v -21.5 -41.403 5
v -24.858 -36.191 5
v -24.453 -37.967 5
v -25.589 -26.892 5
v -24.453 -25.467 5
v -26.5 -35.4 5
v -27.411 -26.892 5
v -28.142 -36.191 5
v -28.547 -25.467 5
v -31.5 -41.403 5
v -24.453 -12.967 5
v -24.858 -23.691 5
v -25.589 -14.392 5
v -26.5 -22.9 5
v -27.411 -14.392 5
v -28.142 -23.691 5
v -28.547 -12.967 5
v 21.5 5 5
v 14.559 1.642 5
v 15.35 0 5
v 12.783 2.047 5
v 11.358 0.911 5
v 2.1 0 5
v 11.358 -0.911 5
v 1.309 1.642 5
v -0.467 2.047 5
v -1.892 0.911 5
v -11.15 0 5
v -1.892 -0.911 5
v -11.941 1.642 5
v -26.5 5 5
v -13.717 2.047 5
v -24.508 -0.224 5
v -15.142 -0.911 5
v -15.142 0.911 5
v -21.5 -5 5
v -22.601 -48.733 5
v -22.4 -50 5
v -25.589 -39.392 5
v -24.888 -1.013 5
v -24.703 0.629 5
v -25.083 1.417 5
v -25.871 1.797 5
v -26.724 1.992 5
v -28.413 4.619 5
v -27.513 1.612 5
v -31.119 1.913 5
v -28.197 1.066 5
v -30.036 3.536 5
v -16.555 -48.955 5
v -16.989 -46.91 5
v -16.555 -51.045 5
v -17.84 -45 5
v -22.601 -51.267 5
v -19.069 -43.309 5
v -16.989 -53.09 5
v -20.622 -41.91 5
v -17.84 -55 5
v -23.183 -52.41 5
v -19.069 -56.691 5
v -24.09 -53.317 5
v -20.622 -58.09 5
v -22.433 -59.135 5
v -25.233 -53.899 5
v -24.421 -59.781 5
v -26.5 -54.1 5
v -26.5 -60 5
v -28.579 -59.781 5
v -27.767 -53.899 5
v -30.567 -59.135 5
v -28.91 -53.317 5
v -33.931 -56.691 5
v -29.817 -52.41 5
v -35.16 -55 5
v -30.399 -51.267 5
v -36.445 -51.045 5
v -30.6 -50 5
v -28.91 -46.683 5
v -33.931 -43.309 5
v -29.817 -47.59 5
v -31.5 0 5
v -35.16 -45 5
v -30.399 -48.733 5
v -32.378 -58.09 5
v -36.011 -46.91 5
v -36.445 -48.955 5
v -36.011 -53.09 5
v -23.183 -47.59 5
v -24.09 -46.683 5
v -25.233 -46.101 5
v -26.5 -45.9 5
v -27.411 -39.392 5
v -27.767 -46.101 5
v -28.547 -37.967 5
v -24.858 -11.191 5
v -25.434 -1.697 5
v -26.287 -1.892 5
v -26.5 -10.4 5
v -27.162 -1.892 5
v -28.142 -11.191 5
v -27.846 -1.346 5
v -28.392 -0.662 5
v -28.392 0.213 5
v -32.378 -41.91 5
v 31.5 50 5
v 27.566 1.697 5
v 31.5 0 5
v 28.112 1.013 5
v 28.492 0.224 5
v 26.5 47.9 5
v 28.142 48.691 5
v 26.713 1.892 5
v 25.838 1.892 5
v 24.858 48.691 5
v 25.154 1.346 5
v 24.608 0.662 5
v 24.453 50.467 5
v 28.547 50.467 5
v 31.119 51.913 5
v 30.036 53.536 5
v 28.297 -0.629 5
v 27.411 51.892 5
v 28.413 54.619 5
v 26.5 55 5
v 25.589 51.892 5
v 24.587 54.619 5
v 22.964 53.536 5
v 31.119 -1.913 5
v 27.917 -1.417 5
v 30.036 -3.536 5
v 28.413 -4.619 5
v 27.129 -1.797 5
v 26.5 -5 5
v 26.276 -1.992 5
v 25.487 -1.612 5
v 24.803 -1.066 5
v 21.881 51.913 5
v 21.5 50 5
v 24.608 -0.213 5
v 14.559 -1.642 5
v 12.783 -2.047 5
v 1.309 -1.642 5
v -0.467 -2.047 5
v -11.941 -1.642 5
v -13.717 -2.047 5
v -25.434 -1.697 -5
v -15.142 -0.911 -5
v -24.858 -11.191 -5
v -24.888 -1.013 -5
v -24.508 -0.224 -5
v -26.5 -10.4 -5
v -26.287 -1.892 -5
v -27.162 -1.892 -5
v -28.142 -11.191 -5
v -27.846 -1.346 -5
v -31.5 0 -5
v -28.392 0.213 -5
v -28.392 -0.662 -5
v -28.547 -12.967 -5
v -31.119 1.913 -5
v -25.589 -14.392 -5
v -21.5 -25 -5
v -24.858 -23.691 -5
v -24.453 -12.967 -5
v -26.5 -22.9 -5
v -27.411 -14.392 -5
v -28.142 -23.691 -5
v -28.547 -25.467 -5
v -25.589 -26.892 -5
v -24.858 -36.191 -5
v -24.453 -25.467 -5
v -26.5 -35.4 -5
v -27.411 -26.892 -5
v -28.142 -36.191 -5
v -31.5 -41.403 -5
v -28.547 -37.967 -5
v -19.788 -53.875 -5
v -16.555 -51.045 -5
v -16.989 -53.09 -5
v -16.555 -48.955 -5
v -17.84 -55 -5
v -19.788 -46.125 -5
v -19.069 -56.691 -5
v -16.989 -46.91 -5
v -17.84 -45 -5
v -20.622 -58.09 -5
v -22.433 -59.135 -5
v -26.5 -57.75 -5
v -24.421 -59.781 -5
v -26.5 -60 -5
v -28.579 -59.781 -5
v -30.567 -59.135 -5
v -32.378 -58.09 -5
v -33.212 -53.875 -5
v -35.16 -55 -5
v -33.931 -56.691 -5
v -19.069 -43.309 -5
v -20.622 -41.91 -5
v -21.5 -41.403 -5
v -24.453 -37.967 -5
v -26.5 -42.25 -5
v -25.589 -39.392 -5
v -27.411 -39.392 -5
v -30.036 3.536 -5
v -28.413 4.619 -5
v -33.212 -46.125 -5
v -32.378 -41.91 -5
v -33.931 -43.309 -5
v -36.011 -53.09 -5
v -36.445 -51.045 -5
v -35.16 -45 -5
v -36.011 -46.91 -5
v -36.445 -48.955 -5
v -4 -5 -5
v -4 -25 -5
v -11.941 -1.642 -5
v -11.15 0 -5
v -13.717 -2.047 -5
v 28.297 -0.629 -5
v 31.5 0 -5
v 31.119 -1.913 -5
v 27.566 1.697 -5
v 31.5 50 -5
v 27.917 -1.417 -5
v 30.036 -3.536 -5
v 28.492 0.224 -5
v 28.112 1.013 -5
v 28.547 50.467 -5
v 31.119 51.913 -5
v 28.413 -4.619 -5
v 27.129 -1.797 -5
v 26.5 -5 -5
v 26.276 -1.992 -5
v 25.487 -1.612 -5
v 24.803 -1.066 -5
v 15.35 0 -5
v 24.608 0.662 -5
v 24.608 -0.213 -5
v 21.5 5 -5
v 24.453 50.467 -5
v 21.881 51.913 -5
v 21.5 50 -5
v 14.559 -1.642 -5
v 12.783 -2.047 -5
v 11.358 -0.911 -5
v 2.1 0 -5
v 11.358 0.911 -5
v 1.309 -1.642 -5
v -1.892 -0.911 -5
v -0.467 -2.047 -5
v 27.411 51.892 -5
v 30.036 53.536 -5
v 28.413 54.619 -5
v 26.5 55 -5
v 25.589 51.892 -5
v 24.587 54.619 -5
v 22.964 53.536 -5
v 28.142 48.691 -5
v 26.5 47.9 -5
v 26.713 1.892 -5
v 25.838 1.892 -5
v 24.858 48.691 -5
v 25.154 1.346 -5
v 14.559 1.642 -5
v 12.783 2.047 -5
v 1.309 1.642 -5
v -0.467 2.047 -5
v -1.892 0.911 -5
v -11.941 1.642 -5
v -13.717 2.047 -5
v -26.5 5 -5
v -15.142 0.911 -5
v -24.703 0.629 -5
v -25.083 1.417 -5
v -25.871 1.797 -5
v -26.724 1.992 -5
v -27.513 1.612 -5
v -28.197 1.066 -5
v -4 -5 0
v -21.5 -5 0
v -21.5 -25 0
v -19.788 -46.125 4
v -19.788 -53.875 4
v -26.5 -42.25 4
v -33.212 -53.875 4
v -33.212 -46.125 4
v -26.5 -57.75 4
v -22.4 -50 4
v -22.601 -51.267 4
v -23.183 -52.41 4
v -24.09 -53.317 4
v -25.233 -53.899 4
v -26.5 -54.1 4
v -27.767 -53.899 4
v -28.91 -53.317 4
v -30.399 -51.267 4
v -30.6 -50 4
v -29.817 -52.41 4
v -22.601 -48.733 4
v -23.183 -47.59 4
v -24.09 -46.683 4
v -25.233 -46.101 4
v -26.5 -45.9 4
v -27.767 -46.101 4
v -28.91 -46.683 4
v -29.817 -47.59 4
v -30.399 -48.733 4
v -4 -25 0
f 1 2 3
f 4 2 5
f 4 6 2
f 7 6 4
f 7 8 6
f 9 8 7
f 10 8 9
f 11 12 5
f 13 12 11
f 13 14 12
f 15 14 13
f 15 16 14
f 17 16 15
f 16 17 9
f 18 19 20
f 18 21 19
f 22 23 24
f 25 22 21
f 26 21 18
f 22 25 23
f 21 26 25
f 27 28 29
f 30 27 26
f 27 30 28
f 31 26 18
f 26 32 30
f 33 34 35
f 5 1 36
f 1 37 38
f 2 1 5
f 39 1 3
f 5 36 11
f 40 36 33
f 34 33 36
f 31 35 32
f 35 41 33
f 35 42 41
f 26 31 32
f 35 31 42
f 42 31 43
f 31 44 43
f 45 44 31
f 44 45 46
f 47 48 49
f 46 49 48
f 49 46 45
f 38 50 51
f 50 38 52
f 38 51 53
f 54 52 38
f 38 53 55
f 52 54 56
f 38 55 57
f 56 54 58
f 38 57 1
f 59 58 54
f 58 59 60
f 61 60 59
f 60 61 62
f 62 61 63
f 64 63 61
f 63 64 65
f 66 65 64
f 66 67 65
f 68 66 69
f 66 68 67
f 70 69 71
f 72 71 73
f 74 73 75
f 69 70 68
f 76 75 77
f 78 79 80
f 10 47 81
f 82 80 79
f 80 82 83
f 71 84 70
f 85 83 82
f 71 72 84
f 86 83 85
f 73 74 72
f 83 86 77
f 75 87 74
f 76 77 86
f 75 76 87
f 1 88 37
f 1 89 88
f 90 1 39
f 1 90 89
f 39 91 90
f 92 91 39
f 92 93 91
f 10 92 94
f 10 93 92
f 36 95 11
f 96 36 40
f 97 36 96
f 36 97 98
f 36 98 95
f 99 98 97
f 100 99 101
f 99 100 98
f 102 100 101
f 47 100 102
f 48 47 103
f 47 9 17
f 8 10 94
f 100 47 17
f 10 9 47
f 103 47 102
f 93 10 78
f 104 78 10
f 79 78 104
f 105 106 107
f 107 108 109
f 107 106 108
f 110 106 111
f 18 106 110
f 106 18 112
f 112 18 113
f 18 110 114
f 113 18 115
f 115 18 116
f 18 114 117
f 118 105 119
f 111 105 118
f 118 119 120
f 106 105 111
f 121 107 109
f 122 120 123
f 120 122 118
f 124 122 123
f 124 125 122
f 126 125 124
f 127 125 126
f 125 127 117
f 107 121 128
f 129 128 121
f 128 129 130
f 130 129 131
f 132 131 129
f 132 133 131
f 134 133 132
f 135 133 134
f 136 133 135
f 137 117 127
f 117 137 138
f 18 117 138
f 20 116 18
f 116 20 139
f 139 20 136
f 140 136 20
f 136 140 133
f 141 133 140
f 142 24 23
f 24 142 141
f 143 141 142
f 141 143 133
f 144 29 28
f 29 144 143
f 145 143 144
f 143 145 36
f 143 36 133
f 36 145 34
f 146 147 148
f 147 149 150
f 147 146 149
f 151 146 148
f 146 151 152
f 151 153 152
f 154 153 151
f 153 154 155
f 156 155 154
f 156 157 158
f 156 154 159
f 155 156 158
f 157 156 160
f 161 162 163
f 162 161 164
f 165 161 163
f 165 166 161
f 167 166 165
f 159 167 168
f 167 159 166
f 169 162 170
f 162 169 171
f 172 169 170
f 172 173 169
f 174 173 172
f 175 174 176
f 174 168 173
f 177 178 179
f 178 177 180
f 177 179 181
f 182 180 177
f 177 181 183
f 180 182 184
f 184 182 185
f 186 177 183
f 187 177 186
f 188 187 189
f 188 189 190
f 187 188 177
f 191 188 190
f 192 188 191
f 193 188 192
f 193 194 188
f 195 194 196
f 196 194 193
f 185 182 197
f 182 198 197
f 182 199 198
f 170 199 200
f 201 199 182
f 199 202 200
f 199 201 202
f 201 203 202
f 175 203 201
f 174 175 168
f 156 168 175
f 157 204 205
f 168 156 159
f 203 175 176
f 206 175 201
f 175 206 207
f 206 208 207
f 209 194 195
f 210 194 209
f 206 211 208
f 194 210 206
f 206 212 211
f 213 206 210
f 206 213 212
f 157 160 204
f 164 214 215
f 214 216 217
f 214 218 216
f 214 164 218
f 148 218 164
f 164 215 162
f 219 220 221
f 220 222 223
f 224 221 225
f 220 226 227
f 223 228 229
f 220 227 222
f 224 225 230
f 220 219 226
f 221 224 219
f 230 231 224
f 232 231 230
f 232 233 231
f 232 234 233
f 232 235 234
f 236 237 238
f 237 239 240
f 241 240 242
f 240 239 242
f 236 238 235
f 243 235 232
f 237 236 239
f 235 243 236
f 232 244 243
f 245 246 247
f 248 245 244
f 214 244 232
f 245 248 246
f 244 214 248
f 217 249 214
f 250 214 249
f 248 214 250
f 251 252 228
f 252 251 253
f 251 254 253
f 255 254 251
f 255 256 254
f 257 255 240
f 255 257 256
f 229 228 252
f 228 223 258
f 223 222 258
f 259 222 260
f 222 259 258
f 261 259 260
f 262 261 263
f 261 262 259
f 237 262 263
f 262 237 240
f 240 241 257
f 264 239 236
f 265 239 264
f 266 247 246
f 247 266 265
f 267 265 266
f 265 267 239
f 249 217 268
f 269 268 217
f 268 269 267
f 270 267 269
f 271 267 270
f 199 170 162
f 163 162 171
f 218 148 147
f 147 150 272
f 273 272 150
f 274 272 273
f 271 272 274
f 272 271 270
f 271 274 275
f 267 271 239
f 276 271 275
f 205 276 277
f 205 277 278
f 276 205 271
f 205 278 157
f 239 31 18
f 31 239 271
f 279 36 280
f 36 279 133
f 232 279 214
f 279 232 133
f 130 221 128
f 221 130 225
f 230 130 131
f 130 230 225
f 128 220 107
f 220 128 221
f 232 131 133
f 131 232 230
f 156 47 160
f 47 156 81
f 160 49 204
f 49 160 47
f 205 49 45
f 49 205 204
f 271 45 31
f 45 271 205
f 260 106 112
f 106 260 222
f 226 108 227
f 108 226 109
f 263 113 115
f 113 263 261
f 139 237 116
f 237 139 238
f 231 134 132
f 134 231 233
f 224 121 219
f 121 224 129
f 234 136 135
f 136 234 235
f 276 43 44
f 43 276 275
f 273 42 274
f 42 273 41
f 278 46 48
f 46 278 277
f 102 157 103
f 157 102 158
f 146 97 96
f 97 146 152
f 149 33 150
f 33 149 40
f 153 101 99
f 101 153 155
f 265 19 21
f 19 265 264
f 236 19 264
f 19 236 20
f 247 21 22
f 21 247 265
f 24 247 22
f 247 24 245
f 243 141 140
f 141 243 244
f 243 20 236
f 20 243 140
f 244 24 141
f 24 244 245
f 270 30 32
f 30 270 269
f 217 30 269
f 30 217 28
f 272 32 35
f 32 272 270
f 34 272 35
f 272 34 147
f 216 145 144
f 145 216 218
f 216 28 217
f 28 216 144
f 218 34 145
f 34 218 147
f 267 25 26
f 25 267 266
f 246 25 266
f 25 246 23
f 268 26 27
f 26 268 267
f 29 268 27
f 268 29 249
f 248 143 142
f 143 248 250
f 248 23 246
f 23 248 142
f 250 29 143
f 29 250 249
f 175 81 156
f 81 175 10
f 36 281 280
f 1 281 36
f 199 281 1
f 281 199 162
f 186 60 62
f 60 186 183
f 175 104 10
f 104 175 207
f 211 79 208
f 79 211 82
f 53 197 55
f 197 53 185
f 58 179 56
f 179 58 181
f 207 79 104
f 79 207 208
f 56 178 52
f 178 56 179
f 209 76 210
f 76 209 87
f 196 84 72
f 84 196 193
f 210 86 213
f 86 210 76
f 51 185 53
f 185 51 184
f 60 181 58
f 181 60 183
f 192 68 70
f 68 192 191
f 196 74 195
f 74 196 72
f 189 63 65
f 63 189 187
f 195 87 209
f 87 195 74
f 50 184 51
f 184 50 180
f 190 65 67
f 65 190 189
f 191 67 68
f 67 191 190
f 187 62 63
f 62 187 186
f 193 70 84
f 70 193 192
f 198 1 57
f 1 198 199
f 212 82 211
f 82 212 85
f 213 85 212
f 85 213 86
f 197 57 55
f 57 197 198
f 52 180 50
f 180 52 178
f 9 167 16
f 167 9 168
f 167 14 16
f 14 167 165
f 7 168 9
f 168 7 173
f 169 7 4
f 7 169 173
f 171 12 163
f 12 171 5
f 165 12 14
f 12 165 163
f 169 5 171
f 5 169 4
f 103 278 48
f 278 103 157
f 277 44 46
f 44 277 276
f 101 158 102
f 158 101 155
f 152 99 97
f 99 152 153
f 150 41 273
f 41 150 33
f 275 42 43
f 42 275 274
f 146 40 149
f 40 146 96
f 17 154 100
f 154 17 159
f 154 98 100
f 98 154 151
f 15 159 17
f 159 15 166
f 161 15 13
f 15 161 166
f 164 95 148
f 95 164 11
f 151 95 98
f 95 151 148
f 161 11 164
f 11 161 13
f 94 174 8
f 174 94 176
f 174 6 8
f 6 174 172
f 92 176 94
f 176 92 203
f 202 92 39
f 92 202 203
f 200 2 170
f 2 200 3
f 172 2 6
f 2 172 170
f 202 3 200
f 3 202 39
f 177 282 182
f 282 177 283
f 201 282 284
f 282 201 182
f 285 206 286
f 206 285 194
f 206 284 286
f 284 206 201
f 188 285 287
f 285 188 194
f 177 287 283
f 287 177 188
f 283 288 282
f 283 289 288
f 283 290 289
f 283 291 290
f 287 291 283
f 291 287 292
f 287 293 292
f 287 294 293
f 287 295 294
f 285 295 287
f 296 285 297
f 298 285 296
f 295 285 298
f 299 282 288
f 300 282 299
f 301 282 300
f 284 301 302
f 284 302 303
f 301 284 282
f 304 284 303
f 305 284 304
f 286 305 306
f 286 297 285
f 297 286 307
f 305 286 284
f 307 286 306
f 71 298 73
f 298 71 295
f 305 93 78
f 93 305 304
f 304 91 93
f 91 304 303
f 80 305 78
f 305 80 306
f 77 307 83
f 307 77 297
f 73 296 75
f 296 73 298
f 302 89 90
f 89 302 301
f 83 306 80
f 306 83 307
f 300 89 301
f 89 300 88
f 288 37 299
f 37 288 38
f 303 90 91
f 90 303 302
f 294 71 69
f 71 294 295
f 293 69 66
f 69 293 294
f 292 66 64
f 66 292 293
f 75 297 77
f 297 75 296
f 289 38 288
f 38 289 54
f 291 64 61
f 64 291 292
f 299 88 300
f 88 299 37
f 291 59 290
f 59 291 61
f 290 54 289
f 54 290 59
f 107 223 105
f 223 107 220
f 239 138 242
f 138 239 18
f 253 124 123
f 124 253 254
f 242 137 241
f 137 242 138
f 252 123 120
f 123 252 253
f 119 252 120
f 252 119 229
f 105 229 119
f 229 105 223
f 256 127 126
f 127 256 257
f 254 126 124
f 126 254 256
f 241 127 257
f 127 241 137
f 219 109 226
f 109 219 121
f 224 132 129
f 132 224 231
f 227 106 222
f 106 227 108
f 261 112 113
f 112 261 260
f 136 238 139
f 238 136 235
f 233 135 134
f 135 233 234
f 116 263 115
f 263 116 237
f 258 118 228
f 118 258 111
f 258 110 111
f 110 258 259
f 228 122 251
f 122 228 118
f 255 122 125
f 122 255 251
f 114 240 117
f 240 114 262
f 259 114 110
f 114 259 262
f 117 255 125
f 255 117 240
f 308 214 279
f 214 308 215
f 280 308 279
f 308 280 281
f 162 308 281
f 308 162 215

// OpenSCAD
espesor_pieza=10;
ancho_pieza=10;
longitud_tensor=50;
longitud_brazo=53;
longitud_brazo_suspension=50;


longitud_brazo_diagonal=sqrt(pow(longitud_brazo,2)+pow(longitud_brazo_suspension,2));

suspension();
//brazo_diagonal();
module suspension(){
	difference(){
		union(){
			//brazo principal HORIZONTAL
			brazo_horizontal();
			
			//brazo vertical
			translate([-longitud_brazo/2,-longitud_brazo_suspension/2,0])
			rotate([0,0,90])
			brazo_vertical();

			
			
			//redondeo fin brazon ppal
			//translate([0,25,0])
			//cylinder(r=10/2, h=10, center=true);
			
			//brazo tensor
			translate([longitud_brazo/2,longitud_tensor/2,0])
			rotate([0,0,-90])
			brazotensor();			
			
			//placa apoyo
			translate([(-longitud_brazo+ancho_pieza*2.5)/2,-ancho_pieza*1.5,-2.5])
			cube([20,20,5], center=true);
		}

		

	}
}

module brazotensor(){
	difference(){
		union(){
			cube([longitud_tensor,ancho_pieza ,espesor_pieza],center=true);
			translate([longitud_tensor/2,0,0])
			cylinder(r=ancho_pieza/2, h=espesor_pieza, center=true);
			translate([-longitud_tensor/2,0,0])
			cylinder(r=ancho_pieza/2, h=espesor_pieza, center=true);
		}
		translate([longitud_tensor/2,0,0])
		cylinder(r=4.2/2, h=20, center=true);
		translate([-longitud_tensor/2,0,0])
		cylinder(r=4.2/2, h=20, center=true);
	}

}

module brazo_horizontal(){
	difference(){
		union(){
			cube([longitud_brazo,ancho_pieza ,espesor_pieza],center=true);
			translate([longitud_brazo/2,0,0])
			cylinder(r=ancho_pieza/2, h=espesor_pieza, center=true);
			translate([-longitud_brazo/2,0,0])
			cylinder(r=ancho_pieza/2, h=espesor_pieza, center=true);
		}
		translate([longitud_brazo/2,0,0])
		cylinder(r=4.2/2, h=20, center=true);
		translate([-longitud_brazo/2,0,0])
		cylinder(r=4.2/2, h=20, center=true);
		translate([longitud_brazo/4,0,0])
		cylinder(r=4.2/2, h=20, center=true);
		translate([-longitud_brazo/4,0,0])
		cylinder(r=4.2/2, h=20, center=true);
		cylinder(r=4.2/2, h=20, center=true);
	}

}

module brazo_vertical(){
	difference(){
		union(){
			//eje principal y redondeo
			cube([longitud_brazo_suspension,ancho_pieza ,espesor_pieza],center=true);
			translate([longitud_brazo_suspension/2,0,0])
			cylinder(r=ancho_pieza/2, h=espesor_pieza, center=true);
			translate([-longitud_brazo_suspension/2,0,0])
			cylinder(r=ancho_pieza/2, h=espesor_pieza, center=true);
			//redondeo alojamiento tuerca
			translate([-longitud_brazo_suspension/2,0,0])
			cylinder(r=20/2, h=espesor_pieza, center=true);

			
		}
		cylinder(r=4.2/2, h=20, center=true);
		translate([longitud_brazo_suspension/2,0,0])
		cylinder(r=4.2/2, h=20, center=true);
		translate([-longitud_brazo_suspension/2,0,0])
		cylinder(r=4.2/2, h=20, center=true);
		translate([longitud_brazo_suspension/4,0,0])
		cylinder(r=4.2/2, h=20, center=true);
		translate([-longitud_brazo_suspension/4,0,0])
		cylinder(r=4.2/2, h=20, center=true);


		//ALOJAMIENTO TUERCA

		translate([-longitud_brazo_suspension/2,0,-espesor_pieza/2])
		cylinder(r=15.5/2, h=espesor_pieza-1,$fn=6);
		
		//EJE TUERCA
		
		translate([-longitud_brazo_suspension/2,0,0])
		cylinder(r=8.2/2, h=espesor_pieza*3,$fn=20);
	}

}

module brazo_diagonal(){
	difference(){
		union(){
			
			cube([longitud_brazo_diagonal,ancho_pieza ,espesor_pieza],center=true);
			translate([longitud_brazo_diagonal/2,0,0])
			cylinder(r=ancho_pieza/2, h=espesor_pieza, center=true);
			translate([-longitud_brazo_diagonal/2,0,0])
			cylinder(r=ancho_pieza/2, h=espesor_pieza, center=true);
		}
		translate([longitud_brazo_diagonal/2,0,0])
		cylinder(r=4.2/2, h=20, center=true);
		translate([-longitud_brazo_diagonal/2,0,0])
		cylinder(r=4.2/2, h=20, center=true);
		translate([longitud_brazo_diagonal/4,0,0])
		cylinder(r=4.2/2, h=20, center=true);
		translate([-longitud_brazo_diagonal/4,0,0])
		cylinder(r=4.2/2, h=20, center=true);
		cylinder(r=4.2/2, h=20, center=true);
	}

}


//brazotensor();
